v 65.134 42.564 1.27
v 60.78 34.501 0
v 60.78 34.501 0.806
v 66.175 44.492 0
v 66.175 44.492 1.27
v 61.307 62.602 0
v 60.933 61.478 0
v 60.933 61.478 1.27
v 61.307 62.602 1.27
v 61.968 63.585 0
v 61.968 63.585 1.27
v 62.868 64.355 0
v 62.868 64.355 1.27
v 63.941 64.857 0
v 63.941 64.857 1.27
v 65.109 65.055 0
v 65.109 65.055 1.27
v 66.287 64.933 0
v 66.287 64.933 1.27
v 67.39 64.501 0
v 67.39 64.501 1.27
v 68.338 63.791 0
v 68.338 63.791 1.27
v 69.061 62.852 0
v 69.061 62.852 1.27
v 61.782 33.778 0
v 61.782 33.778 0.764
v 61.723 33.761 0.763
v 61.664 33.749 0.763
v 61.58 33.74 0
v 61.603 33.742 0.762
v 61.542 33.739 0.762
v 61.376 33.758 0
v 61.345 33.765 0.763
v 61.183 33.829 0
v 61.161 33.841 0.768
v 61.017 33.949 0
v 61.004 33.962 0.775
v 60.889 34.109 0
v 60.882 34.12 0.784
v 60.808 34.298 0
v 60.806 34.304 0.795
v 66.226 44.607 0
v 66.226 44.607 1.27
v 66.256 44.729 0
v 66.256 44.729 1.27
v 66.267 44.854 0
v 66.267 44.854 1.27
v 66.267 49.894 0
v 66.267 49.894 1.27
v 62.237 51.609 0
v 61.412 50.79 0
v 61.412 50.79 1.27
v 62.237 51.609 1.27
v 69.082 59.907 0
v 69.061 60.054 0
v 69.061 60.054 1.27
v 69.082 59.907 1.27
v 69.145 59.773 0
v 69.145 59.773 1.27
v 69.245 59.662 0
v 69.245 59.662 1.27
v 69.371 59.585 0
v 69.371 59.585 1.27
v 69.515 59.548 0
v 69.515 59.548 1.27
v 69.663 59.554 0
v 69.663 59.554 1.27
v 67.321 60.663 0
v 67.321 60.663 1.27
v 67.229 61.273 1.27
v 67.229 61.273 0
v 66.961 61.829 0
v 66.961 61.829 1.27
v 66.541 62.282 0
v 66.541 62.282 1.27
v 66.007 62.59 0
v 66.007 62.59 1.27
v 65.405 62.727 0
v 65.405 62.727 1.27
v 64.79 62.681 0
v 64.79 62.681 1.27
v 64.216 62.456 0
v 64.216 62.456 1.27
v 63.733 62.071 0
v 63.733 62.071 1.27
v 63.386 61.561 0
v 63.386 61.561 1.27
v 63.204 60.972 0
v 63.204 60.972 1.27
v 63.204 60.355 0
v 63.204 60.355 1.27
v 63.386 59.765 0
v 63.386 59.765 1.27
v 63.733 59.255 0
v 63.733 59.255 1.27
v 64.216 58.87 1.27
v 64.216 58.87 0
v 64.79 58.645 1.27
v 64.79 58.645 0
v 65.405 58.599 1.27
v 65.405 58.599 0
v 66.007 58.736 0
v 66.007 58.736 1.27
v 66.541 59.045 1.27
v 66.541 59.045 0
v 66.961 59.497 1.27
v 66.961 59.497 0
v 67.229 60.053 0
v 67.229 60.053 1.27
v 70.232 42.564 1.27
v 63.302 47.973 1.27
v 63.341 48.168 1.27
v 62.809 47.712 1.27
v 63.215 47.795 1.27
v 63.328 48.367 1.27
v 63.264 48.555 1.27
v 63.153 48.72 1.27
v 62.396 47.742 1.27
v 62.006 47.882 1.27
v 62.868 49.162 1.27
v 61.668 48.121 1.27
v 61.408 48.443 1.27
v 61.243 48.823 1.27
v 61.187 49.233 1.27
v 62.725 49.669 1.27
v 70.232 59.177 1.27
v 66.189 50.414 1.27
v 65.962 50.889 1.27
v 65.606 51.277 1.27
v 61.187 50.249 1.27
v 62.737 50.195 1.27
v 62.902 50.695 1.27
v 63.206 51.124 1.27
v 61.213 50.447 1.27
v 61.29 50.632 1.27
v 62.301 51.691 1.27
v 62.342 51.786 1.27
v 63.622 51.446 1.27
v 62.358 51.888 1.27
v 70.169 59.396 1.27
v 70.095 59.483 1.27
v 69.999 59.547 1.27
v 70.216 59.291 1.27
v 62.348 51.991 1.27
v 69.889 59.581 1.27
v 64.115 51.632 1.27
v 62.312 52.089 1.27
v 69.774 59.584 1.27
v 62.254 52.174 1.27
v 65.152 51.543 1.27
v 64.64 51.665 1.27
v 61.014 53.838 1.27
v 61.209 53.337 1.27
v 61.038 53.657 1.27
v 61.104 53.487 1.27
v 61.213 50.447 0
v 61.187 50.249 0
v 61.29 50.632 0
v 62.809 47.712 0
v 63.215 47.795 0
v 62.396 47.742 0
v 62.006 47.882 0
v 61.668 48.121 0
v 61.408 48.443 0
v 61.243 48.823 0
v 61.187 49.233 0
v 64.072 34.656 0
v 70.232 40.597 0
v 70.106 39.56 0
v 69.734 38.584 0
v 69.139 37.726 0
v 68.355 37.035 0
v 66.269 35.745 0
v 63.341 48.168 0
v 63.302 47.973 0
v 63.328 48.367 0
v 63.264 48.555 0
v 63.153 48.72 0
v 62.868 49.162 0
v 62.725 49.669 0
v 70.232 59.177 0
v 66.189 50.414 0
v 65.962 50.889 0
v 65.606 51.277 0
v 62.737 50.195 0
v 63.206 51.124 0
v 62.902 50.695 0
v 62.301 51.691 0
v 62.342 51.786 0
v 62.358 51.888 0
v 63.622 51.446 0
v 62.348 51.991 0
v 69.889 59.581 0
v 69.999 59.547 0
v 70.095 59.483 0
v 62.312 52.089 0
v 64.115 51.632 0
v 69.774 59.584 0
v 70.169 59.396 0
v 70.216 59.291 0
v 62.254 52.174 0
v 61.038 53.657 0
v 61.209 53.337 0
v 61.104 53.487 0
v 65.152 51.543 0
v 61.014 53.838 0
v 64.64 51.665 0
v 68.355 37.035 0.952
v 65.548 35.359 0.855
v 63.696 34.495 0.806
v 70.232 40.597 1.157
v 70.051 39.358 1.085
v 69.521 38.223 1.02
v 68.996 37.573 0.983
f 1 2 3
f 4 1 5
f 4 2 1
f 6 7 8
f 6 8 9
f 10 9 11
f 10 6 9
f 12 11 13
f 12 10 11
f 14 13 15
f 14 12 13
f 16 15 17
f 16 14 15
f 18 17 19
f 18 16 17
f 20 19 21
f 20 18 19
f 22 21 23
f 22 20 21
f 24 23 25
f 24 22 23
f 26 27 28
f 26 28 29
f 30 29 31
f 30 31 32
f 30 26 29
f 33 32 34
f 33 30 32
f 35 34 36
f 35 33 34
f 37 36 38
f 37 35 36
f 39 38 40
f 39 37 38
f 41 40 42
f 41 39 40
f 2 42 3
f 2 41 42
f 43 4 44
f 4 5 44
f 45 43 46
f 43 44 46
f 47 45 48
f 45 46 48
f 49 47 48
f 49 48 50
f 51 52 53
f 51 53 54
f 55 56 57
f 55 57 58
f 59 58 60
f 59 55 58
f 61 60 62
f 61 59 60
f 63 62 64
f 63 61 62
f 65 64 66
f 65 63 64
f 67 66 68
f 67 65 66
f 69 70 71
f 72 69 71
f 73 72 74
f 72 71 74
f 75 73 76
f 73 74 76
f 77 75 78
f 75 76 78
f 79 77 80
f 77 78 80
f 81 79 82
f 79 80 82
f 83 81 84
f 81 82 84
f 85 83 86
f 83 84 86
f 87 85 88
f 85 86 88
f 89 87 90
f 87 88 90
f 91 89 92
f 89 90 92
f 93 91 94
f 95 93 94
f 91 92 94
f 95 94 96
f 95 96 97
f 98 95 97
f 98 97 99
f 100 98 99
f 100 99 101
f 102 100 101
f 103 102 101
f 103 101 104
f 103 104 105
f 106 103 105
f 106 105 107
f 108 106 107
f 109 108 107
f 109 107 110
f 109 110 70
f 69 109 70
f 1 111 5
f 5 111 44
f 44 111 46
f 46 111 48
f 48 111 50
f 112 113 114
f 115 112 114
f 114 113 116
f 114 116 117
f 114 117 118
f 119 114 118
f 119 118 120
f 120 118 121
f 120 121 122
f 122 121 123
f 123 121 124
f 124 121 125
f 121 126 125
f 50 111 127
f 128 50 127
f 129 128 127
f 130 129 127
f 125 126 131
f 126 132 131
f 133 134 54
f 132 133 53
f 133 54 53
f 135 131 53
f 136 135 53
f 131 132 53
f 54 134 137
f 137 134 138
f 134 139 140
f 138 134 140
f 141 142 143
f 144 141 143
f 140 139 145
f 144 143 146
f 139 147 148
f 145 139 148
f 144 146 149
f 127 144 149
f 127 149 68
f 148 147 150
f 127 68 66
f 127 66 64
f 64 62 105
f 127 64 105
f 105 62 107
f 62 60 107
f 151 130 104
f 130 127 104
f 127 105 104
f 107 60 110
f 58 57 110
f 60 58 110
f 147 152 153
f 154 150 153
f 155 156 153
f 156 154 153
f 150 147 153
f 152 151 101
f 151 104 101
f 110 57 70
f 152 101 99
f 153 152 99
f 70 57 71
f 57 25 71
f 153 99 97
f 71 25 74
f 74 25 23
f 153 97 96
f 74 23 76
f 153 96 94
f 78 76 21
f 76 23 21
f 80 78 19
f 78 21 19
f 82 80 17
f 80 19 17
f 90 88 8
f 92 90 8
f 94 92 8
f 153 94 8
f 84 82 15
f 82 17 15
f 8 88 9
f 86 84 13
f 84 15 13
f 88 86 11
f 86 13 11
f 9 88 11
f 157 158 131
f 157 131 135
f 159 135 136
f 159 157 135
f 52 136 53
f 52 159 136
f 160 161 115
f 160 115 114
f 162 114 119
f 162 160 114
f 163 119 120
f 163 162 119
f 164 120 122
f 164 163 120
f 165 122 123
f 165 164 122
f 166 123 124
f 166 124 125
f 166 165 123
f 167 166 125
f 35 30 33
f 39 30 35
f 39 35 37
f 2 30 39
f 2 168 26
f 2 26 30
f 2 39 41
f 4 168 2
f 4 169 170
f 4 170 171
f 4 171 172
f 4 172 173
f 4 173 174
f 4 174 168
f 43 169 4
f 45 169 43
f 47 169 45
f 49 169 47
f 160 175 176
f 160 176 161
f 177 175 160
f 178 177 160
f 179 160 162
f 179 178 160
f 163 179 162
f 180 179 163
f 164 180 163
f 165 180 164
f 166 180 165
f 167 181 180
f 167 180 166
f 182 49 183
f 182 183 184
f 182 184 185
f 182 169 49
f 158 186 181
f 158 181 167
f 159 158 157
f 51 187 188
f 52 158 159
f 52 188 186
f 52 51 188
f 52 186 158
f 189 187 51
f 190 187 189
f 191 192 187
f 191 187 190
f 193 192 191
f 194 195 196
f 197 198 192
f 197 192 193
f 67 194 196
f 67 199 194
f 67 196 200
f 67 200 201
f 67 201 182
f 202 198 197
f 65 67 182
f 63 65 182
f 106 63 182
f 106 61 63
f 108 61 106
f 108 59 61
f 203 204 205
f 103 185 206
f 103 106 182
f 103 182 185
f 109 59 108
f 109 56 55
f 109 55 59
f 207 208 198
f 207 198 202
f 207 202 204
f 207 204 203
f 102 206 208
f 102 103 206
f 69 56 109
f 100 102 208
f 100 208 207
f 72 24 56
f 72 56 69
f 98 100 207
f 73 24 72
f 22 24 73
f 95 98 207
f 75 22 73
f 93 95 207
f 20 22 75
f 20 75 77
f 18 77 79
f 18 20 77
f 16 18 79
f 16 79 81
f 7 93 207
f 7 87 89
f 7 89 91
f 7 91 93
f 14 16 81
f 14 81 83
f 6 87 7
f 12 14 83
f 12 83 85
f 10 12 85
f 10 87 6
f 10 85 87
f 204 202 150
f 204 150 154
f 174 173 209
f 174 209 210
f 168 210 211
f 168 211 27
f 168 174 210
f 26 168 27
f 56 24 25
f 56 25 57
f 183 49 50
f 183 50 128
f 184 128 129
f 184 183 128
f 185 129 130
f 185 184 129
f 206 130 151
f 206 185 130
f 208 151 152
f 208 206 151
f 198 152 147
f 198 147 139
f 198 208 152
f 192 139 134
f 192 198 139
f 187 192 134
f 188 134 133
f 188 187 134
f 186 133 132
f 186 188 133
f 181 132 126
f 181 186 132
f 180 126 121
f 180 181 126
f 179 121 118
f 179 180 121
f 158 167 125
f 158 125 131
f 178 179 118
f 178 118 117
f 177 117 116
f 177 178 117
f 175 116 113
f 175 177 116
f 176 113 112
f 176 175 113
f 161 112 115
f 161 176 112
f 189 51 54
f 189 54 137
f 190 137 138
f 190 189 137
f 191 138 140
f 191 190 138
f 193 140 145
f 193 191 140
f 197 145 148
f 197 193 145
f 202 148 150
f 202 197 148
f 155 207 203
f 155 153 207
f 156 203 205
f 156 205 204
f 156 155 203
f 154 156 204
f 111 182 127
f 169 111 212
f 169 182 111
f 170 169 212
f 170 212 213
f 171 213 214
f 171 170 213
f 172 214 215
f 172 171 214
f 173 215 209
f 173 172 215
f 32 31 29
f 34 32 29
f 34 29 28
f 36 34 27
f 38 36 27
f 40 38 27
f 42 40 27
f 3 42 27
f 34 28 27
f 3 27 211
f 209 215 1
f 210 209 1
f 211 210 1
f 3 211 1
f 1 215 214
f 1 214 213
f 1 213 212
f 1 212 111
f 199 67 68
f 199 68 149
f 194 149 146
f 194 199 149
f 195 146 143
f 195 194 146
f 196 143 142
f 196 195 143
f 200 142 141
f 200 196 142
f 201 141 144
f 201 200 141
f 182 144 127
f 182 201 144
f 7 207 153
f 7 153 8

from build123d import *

# Parameters (mm, degrees)
BOSS_EXTRUDE1_DEPTH = 1.27
SKETCH2_R           = 2.0701
CUT_EXTRUDE1_DEPTH  = 2.27
FILLET1_R           = 0.762
CUT_EXTRUDE2_DEPTH  = 10.452014607


with BuildPart() as part:
    # Sketch1 → Boss-Extrude1 (new body)
    with BuildSketch(Plane.XY):
        with BuildLine():
            Line((70.232354199, 59.177106463), (70.232354199, 40.597101988))
            ThreePointArc((70.232354199, 40.597101988), (69.734336591, 38.583930727), (68.355161738, 37.035138686))
            ThreePointArc((68.355161738, 37.035138686), (65.183135809, 35.174825007), (61.781607592, 33.777641675))
            ThreePointArc((61.781607592, 33.777641675), (61.096065134, 33.883458799), (60.780339592, 34.501101988))
            Line((60.780339592, 34.501101988), (66.266739592, 44.661101988))
            Line((66.266739592, 44.661101988), (66.266739592, 44.697700386))
            Line((66.266739592, 44.697700386), (66.266739592, 49.893501988))
            ThreePointArc((66.266739592, 49.893501988), (63.861714839, 51.557269988), (63.152989358, 48.720021988))
            ThreePointArc((63.152989358, 48.720021988), (63.340826318, 48.267953364), (63.214864671, 47.794896889))
            ThreePointArc((63.214864671, 47.794896889), (61.829181489, 47.989948212), (61.186739592, 49.233101988))
            Line((61.186739592, 49.233101988), (61.186739592, 50.249101988))
            ThreePointArc((61.186739592, 50.249101988), (61.245267671, 50.541969288), (61.411860998, 50.789847191))
            Line((61.411860998, 50.789847191), (62.237339742, 51.609423334))
            ThreePointArc((62.237339742, 51.609423334), (62.358185527, 51.888348141), (62.253539592, 52.173746074))
            Line((62.253539592, 52.173746074), (61.016973645, 53.551101988))
            Line((61.016973645, 53.551101988), (60.932739592, 61.477883946))
            ThreePointArc((60.932739592, 61.477883946), (64.518060362, 64.995788774), (69.060739592, 62.852369819))
            Line((69.060739592, 62.852369819), (69.060739592, 60.053501988))
            ThreePointArc((69.060739592, 60.053501988), (69.244620338, 59.662336155), (69.663143958, 59.554350892))
            ThreePointArc((69.663143958, 59.554350892), (70.049026383, 59.518542276), (70.232354199, 59.177106463))
        make_face()
    extrude(amount=BOSS_EXTRUDE1_DEPTH)

    # Sketch2 → Cut-Extrude1 (cut, through all)
    with BuildSketch(Plane.XY.offset(1.27)):
        with Locations((65.250739592, 60.663101988)):
            Circle(SKETCH2_R)
    extrude(amount=-CUT_EXTRUDE1_DEPTH, mode=Mode.SUBTRACT)

    # Fillet1
    fillet1_edges = [part.edges().sort_by_distance(p)[0] for p in [
        (66.266739592, 44.661101988, 0.635),
        (61.016973645, 53.551101988, 0.635),
    ]]
    fillet(fillet1_edges, radius=FILLET1_R)

    # Sketch3 → Cut-Extrude2 (cut, through all)
    with BuildSketch(Plane(origin=(70.232354199, 0, 0), x_dir=(0, 0, -1), z_dir=(1, 0, 0))):
        Polygon((-1.27, 33.739101988), (-0.762, 33.739101988), (-1.27, 42.563935936), align=None)
    extrude(amount=-CUT_EXTRUDE2_DEPTH, mode=Mode.SUBTRACT)


solid = part.part
